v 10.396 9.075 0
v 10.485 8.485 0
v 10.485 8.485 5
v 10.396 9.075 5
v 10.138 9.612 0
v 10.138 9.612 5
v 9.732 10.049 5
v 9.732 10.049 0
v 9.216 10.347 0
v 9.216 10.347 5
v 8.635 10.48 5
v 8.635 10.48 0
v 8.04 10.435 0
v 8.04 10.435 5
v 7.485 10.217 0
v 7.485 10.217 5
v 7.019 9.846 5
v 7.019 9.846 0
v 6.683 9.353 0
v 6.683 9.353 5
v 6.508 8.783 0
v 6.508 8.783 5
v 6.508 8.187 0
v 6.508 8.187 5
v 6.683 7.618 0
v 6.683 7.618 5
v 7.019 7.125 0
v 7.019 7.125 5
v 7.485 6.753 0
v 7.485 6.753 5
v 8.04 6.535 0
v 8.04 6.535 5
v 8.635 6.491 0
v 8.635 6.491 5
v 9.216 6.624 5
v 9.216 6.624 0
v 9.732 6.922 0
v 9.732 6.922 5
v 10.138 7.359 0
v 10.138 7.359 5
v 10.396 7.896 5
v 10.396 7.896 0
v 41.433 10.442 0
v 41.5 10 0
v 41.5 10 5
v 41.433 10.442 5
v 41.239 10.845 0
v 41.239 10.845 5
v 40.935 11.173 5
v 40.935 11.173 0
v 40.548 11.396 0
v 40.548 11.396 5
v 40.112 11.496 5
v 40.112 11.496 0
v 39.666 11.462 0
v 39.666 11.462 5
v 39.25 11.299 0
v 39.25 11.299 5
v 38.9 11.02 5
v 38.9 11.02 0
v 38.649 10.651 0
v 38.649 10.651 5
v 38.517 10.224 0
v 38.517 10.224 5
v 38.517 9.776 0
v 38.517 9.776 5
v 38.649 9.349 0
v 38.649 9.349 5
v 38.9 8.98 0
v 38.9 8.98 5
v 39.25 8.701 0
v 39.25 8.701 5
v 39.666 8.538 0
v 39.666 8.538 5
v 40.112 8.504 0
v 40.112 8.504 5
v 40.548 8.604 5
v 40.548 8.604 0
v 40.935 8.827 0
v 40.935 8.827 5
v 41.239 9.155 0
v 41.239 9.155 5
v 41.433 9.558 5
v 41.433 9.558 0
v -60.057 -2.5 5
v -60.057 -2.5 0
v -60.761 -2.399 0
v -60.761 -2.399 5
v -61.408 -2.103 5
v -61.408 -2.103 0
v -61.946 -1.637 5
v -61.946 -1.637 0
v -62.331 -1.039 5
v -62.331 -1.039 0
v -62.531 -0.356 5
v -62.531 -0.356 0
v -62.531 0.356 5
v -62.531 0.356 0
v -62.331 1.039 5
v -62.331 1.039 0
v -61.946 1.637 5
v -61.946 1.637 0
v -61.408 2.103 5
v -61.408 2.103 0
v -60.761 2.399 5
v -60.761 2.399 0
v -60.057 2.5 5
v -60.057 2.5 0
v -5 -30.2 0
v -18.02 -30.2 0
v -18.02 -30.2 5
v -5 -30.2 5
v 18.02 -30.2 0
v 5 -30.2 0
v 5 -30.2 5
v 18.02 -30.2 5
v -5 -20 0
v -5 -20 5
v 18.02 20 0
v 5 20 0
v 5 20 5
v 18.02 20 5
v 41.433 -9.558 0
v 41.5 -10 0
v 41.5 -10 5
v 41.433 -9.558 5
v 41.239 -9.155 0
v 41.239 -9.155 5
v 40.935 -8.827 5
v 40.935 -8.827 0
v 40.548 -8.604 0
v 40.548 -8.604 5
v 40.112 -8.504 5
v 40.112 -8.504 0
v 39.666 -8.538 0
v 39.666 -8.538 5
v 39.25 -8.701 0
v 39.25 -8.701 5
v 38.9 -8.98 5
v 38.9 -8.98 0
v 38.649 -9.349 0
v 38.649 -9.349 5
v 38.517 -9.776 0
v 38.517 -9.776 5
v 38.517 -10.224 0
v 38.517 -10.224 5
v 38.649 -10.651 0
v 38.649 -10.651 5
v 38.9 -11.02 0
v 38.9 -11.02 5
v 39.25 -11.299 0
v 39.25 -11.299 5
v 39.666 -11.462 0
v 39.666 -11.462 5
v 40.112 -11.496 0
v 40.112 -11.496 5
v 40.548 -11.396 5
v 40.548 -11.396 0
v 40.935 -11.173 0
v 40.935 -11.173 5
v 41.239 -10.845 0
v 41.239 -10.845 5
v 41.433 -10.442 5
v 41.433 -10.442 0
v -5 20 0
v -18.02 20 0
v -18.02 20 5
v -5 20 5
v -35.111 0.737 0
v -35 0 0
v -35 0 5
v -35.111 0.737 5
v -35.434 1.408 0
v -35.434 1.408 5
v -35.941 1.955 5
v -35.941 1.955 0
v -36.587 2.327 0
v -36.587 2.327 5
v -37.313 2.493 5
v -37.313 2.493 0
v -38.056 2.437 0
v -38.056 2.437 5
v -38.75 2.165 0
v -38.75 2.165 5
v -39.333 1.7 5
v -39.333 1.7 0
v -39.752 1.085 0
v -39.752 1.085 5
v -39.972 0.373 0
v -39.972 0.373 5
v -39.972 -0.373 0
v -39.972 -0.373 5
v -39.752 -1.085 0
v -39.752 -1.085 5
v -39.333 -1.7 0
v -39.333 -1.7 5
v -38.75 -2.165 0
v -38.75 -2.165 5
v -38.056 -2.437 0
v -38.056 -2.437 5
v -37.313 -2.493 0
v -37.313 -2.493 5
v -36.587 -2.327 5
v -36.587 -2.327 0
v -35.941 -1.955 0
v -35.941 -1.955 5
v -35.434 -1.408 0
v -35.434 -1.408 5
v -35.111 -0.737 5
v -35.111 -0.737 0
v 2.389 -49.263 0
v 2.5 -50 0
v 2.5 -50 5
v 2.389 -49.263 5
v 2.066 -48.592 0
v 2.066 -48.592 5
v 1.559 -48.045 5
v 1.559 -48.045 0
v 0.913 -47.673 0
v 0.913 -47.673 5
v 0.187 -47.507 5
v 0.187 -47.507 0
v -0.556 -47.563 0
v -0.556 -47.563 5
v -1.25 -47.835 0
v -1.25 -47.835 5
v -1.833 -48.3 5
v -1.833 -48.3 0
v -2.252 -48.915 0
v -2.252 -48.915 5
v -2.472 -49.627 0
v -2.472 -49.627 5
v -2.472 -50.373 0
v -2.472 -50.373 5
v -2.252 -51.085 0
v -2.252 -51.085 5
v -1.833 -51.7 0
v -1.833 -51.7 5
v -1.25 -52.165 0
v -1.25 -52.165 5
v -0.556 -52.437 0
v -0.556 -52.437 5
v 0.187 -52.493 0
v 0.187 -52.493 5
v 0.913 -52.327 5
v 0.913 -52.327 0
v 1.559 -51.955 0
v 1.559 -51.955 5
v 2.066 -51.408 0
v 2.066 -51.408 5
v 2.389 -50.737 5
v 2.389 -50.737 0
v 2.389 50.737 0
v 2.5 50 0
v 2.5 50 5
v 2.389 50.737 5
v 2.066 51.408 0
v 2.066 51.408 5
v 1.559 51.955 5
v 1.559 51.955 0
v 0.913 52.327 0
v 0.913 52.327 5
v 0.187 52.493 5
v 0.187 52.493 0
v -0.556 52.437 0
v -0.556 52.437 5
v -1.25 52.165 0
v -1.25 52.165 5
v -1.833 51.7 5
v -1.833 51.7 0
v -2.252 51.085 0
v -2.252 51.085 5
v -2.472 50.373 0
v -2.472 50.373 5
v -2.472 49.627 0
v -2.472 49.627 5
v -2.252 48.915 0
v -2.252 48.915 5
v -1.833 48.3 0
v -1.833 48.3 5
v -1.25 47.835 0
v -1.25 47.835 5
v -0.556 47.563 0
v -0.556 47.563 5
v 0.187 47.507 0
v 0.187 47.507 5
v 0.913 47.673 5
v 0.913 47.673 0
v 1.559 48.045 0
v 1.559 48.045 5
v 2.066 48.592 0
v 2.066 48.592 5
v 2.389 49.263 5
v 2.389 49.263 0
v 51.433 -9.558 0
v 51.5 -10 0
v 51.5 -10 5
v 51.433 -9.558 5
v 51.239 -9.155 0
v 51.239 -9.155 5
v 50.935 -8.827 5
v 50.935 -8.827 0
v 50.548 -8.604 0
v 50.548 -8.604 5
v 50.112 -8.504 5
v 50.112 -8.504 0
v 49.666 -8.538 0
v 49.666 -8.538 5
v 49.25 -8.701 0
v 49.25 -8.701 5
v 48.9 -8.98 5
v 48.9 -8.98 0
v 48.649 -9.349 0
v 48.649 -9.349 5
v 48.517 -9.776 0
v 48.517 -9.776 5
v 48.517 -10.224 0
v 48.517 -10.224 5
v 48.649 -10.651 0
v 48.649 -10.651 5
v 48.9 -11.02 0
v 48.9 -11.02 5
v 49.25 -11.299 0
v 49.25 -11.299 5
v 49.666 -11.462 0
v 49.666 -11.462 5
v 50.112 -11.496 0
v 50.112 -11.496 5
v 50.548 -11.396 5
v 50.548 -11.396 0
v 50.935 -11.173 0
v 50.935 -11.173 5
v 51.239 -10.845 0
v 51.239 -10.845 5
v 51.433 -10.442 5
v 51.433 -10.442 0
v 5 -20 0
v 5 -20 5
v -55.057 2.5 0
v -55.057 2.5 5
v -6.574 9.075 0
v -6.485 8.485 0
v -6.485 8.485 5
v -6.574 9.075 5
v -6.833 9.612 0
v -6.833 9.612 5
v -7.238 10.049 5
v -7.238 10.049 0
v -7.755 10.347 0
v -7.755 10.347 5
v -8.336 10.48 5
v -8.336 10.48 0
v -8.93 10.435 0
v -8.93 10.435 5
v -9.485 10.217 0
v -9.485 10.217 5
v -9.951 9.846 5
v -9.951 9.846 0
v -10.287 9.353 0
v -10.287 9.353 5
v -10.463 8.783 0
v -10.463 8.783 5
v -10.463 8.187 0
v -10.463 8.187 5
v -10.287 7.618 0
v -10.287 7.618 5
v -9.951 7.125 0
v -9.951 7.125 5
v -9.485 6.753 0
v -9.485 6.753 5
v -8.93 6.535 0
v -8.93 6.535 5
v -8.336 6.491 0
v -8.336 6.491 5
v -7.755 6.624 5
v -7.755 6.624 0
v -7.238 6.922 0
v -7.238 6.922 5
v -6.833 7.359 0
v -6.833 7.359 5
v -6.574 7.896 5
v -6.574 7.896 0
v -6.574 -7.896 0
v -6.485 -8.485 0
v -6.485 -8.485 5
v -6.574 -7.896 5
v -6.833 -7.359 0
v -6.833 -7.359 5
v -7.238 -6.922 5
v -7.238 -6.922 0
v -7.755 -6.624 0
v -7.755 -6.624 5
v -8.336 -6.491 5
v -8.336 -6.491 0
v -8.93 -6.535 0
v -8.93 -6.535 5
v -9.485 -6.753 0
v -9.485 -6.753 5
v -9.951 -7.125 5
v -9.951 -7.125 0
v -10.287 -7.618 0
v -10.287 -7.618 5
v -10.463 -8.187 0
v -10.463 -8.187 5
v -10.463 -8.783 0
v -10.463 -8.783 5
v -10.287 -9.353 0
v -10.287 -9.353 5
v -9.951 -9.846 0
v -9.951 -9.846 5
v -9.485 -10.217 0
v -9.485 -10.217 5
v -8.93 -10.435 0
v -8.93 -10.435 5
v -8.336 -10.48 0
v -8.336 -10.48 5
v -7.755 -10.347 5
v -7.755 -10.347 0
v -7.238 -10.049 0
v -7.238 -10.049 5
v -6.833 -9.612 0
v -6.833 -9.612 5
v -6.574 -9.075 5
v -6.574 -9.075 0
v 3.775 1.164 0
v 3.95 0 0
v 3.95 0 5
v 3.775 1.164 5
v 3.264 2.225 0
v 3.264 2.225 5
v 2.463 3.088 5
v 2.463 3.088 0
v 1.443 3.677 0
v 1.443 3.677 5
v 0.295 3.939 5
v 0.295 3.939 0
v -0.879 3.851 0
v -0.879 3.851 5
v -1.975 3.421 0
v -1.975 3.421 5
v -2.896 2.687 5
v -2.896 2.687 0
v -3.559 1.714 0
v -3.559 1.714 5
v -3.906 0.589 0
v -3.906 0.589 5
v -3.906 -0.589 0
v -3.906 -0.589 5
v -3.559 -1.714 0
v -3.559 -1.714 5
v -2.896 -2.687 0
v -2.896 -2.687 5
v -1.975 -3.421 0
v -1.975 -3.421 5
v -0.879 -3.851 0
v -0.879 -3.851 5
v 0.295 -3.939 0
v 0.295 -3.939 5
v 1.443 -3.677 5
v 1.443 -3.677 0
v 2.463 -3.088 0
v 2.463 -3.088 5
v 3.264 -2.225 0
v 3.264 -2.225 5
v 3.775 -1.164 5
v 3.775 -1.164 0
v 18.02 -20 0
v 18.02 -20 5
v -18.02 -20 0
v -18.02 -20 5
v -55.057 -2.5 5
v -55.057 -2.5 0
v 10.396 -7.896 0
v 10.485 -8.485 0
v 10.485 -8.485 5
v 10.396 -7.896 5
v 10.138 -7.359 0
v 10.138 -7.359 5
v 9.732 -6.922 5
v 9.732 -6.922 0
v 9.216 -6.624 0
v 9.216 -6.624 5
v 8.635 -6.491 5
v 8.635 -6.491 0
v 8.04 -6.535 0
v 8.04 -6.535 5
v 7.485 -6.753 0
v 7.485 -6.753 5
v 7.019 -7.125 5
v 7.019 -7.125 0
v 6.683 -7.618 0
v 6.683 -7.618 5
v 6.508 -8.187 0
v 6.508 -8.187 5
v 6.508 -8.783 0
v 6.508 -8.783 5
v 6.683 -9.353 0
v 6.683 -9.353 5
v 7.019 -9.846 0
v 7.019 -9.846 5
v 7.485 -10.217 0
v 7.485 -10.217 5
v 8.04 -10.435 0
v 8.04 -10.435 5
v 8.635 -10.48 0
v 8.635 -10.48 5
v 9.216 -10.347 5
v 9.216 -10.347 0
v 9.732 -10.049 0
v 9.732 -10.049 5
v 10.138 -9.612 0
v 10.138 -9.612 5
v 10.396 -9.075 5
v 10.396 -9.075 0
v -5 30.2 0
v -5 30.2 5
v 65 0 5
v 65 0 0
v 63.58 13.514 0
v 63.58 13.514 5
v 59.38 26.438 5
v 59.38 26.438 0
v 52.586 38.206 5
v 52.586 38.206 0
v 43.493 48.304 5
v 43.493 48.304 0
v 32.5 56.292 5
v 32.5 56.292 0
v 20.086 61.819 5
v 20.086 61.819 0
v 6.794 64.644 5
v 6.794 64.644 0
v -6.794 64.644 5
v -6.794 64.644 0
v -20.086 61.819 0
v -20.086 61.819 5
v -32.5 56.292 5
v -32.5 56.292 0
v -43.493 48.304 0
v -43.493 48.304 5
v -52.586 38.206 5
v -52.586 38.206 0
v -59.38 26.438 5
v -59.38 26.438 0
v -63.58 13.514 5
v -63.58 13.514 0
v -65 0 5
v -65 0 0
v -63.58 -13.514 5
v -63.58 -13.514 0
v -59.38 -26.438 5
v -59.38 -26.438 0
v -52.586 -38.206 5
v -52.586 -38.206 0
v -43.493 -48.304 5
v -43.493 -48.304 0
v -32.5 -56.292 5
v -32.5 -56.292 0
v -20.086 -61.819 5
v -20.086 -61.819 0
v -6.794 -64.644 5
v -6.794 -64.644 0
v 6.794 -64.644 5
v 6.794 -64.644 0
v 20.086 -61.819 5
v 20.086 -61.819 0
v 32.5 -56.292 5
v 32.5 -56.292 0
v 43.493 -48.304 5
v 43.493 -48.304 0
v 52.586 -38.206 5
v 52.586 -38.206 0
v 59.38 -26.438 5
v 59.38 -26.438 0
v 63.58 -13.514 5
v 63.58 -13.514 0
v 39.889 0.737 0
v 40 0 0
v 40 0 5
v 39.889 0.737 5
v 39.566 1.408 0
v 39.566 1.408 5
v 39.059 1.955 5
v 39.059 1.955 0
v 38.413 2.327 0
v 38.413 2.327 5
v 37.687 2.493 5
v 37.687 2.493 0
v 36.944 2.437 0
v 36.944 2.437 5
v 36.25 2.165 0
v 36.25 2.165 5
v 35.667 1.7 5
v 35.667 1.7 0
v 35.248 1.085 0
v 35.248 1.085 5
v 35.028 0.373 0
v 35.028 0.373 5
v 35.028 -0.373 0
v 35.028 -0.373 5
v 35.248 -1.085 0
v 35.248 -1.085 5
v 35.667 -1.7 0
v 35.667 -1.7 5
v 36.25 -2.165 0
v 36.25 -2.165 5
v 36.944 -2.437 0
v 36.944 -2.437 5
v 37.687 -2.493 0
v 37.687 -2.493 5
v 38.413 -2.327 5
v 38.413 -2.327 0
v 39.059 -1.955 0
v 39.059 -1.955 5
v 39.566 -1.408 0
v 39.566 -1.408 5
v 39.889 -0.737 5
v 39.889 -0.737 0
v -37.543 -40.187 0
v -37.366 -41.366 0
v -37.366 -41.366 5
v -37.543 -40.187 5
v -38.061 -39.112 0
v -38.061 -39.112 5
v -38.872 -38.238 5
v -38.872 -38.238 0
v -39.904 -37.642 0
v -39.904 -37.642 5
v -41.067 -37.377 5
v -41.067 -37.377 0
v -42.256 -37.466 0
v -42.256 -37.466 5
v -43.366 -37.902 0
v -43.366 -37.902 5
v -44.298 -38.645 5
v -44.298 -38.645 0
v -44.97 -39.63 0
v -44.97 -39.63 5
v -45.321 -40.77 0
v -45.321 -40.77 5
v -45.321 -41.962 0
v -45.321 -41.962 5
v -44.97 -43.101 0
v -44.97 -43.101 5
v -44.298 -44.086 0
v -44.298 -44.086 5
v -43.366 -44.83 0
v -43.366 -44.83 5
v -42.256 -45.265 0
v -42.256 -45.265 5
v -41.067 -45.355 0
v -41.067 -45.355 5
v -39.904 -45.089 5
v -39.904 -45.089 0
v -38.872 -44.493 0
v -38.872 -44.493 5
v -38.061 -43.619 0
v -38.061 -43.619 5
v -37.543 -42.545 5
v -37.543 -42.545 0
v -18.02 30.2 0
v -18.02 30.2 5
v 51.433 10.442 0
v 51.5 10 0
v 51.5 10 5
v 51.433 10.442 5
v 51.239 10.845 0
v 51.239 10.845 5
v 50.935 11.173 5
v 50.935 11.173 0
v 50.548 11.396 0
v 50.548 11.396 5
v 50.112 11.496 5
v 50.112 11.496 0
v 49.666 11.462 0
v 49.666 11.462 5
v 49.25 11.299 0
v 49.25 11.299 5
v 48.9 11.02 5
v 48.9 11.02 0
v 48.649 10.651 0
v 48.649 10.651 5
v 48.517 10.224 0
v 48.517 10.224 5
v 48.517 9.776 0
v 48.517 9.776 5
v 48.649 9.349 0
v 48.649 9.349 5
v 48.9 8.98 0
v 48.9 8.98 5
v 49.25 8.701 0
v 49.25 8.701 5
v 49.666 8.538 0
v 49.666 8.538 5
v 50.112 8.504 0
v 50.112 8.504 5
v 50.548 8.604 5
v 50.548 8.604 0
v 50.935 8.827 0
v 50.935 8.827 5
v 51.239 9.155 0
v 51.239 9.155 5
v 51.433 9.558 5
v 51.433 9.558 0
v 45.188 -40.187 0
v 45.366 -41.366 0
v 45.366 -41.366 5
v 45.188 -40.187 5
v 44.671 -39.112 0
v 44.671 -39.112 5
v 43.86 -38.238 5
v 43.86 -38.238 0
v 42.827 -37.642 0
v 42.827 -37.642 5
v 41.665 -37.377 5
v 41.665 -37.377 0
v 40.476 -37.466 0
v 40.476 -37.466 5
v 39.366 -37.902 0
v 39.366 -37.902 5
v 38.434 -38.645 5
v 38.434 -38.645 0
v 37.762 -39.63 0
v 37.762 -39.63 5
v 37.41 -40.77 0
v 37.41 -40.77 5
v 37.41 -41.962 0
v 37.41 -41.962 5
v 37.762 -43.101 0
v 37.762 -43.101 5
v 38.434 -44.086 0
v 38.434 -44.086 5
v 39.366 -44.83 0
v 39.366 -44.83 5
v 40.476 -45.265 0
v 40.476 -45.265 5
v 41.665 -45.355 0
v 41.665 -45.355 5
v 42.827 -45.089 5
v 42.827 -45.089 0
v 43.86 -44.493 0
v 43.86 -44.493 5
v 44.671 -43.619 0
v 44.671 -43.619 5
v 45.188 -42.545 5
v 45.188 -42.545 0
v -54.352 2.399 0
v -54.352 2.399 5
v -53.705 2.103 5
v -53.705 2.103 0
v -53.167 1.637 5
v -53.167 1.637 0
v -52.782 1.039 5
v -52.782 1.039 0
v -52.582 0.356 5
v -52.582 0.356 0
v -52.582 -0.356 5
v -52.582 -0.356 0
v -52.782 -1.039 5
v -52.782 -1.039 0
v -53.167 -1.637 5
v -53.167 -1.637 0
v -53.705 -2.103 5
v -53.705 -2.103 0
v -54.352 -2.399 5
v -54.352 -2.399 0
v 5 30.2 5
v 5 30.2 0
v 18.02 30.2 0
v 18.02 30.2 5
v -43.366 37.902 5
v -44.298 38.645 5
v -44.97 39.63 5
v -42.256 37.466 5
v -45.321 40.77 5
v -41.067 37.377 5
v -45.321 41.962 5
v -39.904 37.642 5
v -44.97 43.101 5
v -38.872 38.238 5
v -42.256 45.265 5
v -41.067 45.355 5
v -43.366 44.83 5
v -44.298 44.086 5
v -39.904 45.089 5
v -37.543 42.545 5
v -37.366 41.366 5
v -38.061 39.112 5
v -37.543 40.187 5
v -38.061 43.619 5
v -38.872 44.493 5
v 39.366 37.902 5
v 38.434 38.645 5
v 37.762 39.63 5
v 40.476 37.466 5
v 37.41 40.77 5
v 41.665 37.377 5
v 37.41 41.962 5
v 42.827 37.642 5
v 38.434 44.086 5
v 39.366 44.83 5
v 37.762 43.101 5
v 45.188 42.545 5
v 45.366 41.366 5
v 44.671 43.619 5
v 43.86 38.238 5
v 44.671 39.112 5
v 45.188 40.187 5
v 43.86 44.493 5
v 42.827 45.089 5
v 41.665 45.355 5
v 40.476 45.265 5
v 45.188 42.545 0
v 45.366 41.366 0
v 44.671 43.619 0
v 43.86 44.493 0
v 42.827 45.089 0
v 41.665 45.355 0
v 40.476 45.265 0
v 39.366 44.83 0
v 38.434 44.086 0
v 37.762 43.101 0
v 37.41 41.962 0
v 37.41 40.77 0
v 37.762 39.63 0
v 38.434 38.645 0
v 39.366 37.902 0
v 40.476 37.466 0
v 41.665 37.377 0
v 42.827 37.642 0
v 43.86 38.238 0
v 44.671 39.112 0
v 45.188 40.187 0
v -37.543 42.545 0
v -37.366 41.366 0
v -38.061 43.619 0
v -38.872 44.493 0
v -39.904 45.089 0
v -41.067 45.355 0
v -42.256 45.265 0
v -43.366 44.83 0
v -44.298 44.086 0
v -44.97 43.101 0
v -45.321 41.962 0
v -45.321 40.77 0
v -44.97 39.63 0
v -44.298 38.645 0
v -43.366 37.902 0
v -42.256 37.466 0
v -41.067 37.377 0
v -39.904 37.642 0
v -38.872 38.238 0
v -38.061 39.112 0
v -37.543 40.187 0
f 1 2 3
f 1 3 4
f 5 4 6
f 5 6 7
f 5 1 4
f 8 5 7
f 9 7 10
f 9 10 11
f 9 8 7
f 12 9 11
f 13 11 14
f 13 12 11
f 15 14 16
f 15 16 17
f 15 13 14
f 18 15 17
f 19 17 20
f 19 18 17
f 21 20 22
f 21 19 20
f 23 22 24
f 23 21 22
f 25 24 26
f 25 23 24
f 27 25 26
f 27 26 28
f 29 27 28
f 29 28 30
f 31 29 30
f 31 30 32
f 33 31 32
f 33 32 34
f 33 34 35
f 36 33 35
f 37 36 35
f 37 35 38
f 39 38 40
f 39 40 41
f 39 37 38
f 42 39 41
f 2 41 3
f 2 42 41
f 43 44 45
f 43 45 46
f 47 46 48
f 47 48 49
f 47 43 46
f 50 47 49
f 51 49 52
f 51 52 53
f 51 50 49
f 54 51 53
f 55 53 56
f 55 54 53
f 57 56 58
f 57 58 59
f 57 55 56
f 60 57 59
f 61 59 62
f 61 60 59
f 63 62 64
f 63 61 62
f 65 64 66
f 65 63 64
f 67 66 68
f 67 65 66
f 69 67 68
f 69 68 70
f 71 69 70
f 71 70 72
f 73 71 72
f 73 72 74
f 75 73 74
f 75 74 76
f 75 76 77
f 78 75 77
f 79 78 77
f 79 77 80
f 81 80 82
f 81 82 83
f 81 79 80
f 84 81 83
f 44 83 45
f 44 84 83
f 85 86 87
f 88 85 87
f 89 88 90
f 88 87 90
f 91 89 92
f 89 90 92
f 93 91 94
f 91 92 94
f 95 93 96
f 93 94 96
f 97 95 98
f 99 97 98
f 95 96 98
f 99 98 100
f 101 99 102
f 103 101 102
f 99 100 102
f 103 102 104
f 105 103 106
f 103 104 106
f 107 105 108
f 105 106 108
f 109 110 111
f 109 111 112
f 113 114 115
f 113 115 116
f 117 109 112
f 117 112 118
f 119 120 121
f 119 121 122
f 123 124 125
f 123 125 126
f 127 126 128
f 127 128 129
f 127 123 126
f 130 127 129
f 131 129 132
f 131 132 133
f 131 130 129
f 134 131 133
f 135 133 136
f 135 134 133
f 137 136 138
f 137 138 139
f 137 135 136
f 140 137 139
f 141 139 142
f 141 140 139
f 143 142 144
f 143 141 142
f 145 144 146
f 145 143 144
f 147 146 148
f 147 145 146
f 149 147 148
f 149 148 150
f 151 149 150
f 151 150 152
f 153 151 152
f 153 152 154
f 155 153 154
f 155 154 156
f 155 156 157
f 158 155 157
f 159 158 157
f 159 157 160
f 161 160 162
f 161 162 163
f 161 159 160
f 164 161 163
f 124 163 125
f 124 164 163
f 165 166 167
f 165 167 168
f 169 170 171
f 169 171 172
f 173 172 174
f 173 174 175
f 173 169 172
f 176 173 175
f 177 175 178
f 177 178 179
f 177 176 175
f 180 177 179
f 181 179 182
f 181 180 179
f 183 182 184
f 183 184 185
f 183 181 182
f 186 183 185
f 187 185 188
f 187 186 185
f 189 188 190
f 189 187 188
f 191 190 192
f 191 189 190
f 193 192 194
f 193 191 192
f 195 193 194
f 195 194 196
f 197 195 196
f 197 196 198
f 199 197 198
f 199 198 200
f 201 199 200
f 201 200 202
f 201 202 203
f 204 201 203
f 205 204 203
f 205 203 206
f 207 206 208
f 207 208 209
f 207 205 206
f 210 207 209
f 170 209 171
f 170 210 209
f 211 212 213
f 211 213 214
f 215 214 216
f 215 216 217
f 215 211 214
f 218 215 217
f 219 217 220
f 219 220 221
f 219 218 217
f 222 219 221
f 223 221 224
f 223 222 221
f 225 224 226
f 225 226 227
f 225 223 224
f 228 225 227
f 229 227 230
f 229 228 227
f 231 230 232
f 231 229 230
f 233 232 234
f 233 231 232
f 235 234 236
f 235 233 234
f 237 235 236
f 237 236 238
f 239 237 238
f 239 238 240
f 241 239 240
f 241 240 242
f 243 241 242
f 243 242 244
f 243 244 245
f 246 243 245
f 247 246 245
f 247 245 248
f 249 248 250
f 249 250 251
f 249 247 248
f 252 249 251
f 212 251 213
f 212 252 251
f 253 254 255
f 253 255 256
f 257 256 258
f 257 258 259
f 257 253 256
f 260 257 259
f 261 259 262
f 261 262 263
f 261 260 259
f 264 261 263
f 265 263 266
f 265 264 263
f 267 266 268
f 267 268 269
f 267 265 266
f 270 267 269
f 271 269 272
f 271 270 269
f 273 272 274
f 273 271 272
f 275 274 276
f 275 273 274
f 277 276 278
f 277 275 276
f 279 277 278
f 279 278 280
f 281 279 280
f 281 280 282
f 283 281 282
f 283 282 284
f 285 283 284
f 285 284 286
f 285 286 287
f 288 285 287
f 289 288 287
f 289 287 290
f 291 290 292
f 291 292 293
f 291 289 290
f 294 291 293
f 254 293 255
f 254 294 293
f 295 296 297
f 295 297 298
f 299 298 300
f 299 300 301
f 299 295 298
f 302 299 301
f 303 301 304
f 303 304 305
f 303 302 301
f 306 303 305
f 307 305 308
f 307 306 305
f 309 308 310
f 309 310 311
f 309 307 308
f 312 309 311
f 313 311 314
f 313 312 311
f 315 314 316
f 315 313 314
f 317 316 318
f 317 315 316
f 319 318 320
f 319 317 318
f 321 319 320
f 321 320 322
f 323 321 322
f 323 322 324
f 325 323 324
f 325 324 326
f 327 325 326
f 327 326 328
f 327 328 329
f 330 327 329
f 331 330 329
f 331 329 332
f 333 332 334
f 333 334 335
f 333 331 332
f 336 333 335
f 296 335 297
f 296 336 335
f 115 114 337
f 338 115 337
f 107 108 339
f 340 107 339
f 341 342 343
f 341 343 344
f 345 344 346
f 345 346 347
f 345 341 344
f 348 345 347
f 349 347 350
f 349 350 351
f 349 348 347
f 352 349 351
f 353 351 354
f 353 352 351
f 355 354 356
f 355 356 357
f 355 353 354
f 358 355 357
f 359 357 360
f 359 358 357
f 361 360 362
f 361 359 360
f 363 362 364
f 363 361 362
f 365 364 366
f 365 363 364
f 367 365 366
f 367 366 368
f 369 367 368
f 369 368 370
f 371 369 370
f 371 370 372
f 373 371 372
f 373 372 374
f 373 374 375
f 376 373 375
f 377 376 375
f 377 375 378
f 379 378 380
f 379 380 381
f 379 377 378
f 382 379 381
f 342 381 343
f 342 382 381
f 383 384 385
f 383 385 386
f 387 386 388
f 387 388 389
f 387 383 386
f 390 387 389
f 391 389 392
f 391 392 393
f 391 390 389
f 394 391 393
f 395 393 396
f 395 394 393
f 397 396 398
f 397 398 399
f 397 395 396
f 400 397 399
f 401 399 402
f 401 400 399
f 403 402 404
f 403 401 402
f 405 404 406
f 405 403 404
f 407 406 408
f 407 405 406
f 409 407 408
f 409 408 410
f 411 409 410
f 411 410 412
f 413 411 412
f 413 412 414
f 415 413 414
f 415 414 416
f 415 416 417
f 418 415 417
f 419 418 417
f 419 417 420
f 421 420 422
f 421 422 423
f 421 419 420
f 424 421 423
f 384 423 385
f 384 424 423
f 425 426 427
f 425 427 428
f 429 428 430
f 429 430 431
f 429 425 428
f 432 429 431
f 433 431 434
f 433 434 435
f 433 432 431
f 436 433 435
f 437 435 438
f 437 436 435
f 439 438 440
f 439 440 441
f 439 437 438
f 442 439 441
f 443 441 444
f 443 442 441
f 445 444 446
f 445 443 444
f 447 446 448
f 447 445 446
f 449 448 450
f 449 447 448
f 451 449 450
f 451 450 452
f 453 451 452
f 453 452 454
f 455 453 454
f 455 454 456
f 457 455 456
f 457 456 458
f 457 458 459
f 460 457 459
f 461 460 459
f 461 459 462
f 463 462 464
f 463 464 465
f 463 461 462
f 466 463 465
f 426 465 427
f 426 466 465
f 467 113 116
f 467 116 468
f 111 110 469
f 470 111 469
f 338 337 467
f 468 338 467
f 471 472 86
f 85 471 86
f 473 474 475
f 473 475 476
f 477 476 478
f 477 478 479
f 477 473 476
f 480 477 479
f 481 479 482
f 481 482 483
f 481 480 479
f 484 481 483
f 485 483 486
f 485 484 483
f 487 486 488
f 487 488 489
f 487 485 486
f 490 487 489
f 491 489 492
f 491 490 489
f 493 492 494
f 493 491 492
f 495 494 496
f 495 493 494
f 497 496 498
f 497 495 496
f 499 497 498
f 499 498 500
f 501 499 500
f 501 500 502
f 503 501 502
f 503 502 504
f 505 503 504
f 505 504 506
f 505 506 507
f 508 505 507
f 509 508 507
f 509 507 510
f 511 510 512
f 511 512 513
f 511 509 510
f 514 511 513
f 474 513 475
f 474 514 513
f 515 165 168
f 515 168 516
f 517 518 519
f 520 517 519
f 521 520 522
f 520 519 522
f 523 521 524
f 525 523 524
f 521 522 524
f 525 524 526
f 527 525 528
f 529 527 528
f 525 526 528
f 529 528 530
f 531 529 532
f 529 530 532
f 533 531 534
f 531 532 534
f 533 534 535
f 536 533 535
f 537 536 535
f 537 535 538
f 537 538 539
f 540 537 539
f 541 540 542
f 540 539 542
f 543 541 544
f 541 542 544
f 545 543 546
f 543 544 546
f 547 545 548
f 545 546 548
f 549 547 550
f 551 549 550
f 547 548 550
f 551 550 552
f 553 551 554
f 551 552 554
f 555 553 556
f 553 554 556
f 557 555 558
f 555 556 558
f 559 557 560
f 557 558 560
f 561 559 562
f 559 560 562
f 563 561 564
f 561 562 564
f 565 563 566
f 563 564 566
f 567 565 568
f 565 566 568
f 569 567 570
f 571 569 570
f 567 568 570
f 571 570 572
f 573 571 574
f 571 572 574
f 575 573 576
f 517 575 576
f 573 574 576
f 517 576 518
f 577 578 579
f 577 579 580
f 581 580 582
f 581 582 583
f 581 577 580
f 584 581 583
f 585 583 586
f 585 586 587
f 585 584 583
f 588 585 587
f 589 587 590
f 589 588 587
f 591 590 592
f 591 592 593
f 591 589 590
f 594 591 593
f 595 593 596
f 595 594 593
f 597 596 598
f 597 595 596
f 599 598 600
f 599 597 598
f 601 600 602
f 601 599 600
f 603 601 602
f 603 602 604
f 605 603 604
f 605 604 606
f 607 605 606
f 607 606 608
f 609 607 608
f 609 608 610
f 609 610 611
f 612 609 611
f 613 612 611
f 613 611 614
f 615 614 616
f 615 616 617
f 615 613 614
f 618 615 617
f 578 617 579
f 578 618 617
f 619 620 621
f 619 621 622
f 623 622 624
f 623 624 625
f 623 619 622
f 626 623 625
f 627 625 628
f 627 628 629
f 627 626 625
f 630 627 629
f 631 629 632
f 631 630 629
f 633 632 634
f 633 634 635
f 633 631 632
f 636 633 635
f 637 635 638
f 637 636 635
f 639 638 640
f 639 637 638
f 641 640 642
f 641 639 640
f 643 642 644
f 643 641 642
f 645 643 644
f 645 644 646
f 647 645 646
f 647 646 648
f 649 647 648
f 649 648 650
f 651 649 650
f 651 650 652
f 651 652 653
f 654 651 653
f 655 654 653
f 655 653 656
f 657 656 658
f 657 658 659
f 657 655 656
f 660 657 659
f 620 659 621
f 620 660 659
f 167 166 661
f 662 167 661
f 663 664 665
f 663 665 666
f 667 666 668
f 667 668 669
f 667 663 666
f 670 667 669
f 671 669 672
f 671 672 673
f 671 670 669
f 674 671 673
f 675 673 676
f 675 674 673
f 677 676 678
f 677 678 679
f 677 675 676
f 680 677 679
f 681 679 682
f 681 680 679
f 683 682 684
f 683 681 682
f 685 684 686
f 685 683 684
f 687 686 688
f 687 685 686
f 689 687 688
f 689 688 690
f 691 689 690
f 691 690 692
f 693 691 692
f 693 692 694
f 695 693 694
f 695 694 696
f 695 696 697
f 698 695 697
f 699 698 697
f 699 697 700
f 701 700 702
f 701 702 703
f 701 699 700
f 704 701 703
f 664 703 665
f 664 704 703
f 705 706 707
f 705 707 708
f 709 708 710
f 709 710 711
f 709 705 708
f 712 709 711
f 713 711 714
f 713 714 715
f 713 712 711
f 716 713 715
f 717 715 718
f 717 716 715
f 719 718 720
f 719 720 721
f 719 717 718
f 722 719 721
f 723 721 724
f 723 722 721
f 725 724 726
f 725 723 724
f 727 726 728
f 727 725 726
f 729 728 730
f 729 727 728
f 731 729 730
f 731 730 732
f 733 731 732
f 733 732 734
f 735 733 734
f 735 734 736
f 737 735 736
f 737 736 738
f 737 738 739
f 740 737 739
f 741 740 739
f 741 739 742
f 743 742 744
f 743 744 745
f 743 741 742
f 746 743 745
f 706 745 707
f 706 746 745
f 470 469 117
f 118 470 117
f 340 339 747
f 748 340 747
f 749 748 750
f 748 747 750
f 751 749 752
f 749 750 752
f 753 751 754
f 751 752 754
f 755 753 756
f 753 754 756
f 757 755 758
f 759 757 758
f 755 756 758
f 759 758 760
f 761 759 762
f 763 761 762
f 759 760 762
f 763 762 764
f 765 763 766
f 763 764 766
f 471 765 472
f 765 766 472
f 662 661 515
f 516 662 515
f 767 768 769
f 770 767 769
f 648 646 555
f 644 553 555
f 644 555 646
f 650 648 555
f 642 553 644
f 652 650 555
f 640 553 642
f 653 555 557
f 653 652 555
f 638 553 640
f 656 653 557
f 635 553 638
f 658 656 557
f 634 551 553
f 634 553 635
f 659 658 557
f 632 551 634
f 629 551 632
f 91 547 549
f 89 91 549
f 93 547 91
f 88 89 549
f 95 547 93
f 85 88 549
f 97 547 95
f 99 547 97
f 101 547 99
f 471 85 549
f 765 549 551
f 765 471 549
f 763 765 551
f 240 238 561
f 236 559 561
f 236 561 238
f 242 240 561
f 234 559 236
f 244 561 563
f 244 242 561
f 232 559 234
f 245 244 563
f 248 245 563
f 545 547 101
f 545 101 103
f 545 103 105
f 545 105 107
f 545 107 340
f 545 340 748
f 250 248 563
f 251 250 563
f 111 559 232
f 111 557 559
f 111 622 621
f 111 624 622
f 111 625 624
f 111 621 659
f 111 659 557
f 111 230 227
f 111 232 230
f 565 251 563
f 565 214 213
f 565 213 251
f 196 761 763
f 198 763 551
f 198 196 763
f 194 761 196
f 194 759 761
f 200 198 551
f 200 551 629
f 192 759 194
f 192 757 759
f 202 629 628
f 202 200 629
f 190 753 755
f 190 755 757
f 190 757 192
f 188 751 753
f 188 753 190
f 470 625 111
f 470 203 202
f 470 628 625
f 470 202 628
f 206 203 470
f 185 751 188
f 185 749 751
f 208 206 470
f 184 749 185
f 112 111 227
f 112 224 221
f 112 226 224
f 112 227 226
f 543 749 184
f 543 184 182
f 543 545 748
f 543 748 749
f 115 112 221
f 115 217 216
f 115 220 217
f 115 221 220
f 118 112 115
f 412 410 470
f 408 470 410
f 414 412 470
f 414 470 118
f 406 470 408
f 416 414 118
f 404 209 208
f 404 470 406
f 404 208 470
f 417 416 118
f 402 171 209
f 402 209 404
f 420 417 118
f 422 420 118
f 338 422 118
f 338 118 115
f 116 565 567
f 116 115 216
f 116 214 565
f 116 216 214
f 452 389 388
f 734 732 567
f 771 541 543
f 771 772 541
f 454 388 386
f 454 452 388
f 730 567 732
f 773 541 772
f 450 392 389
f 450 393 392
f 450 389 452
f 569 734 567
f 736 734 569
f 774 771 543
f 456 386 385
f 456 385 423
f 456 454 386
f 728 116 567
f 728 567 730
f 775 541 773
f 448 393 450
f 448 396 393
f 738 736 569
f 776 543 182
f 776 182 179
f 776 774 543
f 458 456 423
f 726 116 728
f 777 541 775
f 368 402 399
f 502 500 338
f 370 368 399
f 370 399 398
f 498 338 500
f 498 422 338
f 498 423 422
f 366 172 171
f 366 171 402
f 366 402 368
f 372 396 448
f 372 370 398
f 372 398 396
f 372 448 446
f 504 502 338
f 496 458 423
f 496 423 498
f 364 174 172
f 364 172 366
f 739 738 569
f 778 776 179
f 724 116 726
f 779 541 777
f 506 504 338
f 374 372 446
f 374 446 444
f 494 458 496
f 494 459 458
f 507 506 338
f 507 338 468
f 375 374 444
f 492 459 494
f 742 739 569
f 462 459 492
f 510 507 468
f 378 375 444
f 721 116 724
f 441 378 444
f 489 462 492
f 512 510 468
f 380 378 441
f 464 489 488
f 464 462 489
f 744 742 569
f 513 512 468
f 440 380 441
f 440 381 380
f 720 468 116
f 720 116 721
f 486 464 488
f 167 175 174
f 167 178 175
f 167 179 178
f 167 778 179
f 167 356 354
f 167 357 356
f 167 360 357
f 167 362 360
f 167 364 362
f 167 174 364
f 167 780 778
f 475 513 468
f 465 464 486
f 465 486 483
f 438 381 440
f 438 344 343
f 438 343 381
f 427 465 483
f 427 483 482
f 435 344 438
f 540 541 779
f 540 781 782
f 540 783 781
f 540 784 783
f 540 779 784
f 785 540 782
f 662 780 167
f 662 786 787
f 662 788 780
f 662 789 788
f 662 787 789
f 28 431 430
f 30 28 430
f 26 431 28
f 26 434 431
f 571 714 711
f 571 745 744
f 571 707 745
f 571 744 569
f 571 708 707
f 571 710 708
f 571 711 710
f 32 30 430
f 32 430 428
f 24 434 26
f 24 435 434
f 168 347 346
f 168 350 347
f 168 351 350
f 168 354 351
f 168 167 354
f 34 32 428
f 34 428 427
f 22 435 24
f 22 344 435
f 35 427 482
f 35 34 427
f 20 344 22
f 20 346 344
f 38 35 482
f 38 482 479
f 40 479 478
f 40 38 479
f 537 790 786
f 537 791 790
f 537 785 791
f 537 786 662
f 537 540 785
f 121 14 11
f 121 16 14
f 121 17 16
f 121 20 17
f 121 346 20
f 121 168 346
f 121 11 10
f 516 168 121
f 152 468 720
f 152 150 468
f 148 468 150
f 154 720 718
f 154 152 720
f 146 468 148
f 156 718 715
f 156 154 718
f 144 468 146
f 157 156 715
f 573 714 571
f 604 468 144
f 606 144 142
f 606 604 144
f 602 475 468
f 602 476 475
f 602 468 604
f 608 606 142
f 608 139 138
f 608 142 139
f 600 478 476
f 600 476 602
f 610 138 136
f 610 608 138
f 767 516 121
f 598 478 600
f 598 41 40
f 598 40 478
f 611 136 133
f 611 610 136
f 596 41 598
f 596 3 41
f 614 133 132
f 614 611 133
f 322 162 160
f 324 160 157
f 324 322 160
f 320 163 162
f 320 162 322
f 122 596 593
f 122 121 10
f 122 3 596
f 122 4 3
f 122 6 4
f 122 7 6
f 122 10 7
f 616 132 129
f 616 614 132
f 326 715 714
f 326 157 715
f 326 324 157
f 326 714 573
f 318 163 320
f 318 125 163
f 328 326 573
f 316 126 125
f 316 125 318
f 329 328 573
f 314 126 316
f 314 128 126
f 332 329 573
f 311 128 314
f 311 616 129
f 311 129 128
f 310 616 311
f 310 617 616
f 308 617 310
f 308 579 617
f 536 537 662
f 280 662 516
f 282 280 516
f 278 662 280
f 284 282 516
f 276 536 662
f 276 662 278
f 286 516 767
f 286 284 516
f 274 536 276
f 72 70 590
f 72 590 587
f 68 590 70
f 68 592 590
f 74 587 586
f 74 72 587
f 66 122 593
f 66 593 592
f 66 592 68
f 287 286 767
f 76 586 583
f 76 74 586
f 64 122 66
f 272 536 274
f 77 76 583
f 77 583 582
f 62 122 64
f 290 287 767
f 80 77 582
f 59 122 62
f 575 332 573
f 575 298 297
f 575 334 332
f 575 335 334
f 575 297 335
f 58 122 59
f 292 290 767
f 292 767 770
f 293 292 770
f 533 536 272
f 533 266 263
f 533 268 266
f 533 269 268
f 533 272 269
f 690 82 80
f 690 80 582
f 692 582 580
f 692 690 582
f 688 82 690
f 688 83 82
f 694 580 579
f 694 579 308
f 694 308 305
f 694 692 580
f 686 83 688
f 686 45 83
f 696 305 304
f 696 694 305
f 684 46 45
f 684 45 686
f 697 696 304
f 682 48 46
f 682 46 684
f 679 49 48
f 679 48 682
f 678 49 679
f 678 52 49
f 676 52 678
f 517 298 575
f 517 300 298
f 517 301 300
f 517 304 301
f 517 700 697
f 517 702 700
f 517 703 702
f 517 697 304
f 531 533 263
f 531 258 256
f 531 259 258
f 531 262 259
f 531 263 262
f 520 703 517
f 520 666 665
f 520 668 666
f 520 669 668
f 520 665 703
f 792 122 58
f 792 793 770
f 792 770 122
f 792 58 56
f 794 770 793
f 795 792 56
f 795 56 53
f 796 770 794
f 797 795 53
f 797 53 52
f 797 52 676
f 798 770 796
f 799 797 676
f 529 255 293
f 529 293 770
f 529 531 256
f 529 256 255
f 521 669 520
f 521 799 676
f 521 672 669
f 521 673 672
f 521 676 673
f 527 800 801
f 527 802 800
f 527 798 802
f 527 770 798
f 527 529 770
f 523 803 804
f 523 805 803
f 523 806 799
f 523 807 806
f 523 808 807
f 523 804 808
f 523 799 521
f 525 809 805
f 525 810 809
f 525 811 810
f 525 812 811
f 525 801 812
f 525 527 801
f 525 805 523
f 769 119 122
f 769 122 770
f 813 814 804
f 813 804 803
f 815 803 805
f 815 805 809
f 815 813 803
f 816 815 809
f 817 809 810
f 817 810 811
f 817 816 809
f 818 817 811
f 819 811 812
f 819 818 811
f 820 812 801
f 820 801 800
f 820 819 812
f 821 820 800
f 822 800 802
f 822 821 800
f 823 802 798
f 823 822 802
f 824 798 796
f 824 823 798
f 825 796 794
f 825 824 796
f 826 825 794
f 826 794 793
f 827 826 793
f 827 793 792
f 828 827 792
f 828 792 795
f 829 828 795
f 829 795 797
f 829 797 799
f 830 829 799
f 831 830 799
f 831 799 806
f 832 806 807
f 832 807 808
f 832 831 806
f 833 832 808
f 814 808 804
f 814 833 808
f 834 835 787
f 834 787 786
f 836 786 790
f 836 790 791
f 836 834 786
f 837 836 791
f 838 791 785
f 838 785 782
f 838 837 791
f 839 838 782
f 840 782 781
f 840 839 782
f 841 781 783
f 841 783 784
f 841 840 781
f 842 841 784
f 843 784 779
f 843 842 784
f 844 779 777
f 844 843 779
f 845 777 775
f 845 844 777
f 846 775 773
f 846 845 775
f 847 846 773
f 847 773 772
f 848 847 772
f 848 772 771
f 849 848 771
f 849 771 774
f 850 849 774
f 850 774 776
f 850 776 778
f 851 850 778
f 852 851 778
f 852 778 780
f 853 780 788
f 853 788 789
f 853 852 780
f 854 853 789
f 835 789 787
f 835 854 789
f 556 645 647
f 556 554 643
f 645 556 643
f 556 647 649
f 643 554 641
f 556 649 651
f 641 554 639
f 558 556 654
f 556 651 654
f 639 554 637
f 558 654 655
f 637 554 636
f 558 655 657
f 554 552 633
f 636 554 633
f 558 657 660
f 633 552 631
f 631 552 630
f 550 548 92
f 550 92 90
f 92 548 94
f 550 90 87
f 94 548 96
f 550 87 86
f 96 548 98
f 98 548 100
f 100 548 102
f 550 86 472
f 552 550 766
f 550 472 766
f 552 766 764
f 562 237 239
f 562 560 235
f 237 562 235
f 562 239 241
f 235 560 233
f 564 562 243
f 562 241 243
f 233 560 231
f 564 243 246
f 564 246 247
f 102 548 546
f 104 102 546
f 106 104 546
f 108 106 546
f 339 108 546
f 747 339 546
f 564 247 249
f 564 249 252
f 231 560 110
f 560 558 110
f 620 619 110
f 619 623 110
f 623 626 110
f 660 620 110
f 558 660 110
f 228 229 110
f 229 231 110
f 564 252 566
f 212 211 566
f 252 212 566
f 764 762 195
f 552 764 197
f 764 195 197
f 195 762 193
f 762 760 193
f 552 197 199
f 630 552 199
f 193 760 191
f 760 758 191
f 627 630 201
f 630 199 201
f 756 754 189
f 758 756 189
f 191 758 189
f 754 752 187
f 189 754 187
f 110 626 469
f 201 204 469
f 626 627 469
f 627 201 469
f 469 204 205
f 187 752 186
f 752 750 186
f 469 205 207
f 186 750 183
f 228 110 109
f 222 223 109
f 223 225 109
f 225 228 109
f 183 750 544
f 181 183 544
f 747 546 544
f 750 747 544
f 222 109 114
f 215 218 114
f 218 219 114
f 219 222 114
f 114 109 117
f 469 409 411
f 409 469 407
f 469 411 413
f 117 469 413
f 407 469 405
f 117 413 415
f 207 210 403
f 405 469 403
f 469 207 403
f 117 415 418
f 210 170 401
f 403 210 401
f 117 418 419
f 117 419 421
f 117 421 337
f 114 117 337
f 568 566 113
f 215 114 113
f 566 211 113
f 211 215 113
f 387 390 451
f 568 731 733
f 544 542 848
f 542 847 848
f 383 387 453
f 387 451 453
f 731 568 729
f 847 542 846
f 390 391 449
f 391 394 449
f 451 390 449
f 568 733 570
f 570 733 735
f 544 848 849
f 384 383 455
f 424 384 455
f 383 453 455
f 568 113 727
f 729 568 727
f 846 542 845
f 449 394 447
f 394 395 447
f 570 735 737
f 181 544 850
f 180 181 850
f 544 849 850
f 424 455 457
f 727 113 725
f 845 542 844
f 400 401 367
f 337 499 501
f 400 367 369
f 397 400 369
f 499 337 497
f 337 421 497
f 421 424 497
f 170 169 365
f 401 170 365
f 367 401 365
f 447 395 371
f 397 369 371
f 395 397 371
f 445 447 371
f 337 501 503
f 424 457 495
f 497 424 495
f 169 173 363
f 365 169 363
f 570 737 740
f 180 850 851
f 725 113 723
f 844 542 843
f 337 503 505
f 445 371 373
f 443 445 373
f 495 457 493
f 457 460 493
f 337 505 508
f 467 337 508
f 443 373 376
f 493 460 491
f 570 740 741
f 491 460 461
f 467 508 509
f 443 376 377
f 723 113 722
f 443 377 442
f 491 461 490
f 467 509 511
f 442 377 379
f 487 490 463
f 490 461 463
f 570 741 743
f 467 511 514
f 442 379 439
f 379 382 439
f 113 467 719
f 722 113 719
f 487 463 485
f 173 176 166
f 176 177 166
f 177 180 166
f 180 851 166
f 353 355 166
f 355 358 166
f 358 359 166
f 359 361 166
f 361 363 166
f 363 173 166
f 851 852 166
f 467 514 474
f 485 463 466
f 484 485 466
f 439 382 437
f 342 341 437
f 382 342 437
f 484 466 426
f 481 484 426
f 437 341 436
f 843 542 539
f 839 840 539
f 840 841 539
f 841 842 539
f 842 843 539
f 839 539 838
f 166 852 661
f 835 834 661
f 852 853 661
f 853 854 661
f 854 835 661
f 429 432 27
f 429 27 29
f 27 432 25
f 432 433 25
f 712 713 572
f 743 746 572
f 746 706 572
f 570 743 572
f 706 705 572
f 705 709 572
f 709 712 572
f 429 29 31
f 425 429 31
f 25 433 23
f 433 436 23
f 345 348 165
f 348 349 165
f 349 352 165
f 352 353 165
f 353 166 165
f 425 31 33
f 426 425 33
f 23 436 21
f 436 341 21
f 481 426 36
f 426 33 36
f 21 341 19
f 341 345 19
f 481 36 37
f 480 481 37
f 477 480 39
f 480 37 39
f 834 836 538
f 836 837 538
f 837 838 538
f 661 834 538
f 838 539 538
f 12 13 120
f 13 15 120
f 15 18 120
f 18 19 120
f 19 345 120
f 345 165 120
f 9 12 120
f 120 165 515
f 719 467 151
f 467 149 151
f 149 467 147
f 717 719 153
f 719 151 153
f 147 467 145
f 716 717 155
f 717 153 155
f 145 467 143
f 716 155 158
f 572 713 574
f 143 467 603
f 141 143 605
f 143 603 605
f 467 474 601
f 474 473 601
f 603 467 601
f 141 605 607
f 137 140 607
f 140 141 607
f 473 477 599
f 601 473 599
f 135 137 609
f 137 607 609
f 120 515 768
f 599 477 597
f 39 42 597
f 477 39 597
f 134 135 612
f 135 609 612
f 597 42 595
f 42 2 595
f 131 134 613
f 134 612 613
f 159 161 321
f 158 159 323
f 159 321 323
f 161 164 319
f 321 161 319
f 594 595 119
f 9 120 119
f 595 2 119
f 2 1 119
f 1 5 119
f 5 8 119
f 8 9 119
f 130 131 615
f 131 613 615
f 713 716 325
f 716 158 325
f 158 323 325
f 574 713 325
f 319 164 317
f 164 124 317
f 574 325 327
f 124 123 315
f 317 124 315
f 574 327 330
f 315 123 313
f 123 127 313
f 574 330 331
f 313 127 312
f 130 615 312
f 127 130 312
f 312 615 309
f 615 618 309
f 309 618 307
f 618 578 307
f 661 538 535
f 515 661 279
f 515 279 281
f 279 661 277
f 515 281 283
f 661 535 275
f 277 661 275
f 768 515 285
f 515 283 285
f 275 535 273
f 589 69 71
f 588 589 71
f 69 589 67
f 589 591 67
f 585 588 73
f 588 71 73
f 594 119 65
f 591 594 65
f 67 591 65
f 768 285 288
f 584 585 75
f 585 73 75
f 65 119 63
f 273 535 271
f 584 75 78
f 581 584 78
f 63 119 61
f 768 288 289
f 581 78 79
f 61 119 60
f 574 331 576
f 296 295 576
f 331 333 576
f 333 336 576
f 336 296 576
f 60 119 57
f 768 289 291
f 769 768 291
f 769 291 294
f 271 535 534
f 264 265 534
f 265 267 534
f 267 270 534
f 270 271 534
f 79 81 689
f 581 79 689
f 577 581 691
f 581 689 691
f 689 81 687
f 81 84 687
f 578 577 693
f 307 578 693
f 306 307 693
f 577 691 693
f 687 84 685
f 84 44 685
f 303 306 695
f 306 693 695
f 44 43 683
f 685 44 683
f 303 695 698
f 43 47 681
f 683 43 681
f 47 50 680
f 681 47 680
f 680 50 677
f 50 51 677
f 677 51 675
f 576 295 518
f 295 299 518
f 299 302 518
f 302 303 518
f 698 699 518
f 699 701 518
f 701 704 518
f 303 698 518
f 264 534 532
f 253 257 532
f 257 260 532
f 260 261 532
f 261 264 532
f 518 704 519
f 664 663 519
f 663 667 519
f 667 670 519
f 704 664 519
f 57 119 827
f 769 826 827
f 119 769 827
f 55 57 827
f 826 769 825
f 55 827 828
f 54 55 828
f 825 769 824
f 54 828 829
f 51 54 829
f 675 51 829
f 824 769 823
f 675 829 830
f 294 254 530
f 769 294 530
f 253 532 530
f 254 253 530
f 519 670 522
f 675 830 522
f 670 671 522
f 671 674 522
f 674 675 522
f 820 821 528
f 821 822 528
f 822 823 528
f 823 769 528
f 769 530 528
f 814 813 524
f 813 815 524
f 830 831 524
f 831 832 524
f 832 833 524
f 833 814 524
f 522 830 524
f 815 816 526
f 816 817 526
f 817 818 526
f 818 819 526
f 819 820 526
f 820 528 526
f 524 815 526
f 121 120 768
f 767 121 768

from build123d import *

# Parameters (mm, degrees)
SKETCH1_R           = 65
SKETCH1_R_2         = 2.5
SKETCH1_R_3         = 3.95
SKETCH1_R_4         = 1.5
SKETCH1_R_5         = 4
SKETCH1_R_6         = 2
SKETCH1_W           = 13.02
SKETCH1_H           = 10.2
BOSS_EXTRUDE1_DEPTH = 5


with BuildPart() as part:
    # Sketch1 → Boss-Extrude1 (new body)
    with BuildSketch(Plane.XY):
        Circle(SKETCH1_R)
        with Locations((-37.5, 0)):
            Circle(SKETCH1_R_2, mode=Mode.SUBTRACT)
        with Locations((37.5, 0)):
            Circle(SKETCH1_R_2, mode=Mode.SUBTRACT)
        with Locations((0, 50)):
            Circle(SKETCH1_R_2, mode=Mode.SUBTRACT)
        with Locations((0, -50)):
            Circle(SKETCH1_R_2, mode=Mode.SUBTRACT)
        Circle(SKETCH1_R_3, mode=Mode.SUBTRACT)
        with Locations((50, 10)):
            Circle(SKETCH1_R_4, mode=Mode.SUBTRACT)
        with Locations((50, -10)):
            Circle(SKETCH1_R_4, mode=Mode.SUBTRACT)
        with Locations((40, 10)):
            Circle(SKETCH1_R_4, mode=Mode.SUBTRACT)
        with Locations((40, -10)):
            Circle(SKETCH1_R_4, mode=Mode.SUBTRACT)
        with Locations((-41.365746699, 41.365746699)):
            Circle(SKETCH1_R_5, mode=Mode.SUBTRACT)
        with Locations((41.365746699, -41.365746699)):
            Circle(SKETCH1_R_5, mode=Mode.SUBTRACT)
        with Locations((41.365746699, 41.365746699)):
            Circle(SKETCH1_R_5, mode=Mode.SUBTRACT)
        with Locations((-41.365746699, -41.365746699)):
            Circle(SKETCH1_R_5, mode=Mode.SUBTRACT)
        with Locations((8.485281374, 8.485281374)):
            Circle(SKETCH1_R_6, mode=Mode.SUBTRACT)
        with Locations((8.485281374, -8.485281374)):
            Circle(SKETCH1_R_6, mode=Mode.SUBTRACT)
        with Locations((-8.485281374, -8.485281374)):
            Circle(SKETCH1_R_6, mode=Mode.SUBTRACT)
        with Locations((-8.485281374, 8.485281374)):
            Circle(SKETCH1_R_6, mode=Mode.SUBTRACT)
        with Locations((11.51, -25.1)):
            Rectangle(SKETCH1_W, SKETCH1_H, mode=Mode.SUBTRACT)
        with Locations((-11.51, -25.1)):
            Rectangle(SKETCH1_W, SKETCH1_H, mode=Mode.SUBTRACT)
        with Locations((-11.51, 25.1)):
            Rectangle(SKETCH1_W, SKETCH1_H, mode=Mode.SUBTRACT)
        with Locations((11.51, 25.1)):
            Rectangle(SKETCH1_W, SKETCH1_H, mode=Mode.SUBTRACT)
        with BuildLine():
            Line((-55.056563459, -2.5), (-60.056563459, -2.5))
            ThreePointArc((-60.056563459, -2.5), (-62.556563459, 0), (-60.056563459, 2.5))
            Line((-60.056563459, 2.5), (-55.056563459, 2.5))
            ThreePointArc((-55.056563459, 2.5), (-52.556563459, 0), (-55.056563459, -2.5))
        make_face(mode=Mode.SUBTRACT)
    extrude(amount=BOSS_EXTRUDE1_DEPTH)


solid = part.part
